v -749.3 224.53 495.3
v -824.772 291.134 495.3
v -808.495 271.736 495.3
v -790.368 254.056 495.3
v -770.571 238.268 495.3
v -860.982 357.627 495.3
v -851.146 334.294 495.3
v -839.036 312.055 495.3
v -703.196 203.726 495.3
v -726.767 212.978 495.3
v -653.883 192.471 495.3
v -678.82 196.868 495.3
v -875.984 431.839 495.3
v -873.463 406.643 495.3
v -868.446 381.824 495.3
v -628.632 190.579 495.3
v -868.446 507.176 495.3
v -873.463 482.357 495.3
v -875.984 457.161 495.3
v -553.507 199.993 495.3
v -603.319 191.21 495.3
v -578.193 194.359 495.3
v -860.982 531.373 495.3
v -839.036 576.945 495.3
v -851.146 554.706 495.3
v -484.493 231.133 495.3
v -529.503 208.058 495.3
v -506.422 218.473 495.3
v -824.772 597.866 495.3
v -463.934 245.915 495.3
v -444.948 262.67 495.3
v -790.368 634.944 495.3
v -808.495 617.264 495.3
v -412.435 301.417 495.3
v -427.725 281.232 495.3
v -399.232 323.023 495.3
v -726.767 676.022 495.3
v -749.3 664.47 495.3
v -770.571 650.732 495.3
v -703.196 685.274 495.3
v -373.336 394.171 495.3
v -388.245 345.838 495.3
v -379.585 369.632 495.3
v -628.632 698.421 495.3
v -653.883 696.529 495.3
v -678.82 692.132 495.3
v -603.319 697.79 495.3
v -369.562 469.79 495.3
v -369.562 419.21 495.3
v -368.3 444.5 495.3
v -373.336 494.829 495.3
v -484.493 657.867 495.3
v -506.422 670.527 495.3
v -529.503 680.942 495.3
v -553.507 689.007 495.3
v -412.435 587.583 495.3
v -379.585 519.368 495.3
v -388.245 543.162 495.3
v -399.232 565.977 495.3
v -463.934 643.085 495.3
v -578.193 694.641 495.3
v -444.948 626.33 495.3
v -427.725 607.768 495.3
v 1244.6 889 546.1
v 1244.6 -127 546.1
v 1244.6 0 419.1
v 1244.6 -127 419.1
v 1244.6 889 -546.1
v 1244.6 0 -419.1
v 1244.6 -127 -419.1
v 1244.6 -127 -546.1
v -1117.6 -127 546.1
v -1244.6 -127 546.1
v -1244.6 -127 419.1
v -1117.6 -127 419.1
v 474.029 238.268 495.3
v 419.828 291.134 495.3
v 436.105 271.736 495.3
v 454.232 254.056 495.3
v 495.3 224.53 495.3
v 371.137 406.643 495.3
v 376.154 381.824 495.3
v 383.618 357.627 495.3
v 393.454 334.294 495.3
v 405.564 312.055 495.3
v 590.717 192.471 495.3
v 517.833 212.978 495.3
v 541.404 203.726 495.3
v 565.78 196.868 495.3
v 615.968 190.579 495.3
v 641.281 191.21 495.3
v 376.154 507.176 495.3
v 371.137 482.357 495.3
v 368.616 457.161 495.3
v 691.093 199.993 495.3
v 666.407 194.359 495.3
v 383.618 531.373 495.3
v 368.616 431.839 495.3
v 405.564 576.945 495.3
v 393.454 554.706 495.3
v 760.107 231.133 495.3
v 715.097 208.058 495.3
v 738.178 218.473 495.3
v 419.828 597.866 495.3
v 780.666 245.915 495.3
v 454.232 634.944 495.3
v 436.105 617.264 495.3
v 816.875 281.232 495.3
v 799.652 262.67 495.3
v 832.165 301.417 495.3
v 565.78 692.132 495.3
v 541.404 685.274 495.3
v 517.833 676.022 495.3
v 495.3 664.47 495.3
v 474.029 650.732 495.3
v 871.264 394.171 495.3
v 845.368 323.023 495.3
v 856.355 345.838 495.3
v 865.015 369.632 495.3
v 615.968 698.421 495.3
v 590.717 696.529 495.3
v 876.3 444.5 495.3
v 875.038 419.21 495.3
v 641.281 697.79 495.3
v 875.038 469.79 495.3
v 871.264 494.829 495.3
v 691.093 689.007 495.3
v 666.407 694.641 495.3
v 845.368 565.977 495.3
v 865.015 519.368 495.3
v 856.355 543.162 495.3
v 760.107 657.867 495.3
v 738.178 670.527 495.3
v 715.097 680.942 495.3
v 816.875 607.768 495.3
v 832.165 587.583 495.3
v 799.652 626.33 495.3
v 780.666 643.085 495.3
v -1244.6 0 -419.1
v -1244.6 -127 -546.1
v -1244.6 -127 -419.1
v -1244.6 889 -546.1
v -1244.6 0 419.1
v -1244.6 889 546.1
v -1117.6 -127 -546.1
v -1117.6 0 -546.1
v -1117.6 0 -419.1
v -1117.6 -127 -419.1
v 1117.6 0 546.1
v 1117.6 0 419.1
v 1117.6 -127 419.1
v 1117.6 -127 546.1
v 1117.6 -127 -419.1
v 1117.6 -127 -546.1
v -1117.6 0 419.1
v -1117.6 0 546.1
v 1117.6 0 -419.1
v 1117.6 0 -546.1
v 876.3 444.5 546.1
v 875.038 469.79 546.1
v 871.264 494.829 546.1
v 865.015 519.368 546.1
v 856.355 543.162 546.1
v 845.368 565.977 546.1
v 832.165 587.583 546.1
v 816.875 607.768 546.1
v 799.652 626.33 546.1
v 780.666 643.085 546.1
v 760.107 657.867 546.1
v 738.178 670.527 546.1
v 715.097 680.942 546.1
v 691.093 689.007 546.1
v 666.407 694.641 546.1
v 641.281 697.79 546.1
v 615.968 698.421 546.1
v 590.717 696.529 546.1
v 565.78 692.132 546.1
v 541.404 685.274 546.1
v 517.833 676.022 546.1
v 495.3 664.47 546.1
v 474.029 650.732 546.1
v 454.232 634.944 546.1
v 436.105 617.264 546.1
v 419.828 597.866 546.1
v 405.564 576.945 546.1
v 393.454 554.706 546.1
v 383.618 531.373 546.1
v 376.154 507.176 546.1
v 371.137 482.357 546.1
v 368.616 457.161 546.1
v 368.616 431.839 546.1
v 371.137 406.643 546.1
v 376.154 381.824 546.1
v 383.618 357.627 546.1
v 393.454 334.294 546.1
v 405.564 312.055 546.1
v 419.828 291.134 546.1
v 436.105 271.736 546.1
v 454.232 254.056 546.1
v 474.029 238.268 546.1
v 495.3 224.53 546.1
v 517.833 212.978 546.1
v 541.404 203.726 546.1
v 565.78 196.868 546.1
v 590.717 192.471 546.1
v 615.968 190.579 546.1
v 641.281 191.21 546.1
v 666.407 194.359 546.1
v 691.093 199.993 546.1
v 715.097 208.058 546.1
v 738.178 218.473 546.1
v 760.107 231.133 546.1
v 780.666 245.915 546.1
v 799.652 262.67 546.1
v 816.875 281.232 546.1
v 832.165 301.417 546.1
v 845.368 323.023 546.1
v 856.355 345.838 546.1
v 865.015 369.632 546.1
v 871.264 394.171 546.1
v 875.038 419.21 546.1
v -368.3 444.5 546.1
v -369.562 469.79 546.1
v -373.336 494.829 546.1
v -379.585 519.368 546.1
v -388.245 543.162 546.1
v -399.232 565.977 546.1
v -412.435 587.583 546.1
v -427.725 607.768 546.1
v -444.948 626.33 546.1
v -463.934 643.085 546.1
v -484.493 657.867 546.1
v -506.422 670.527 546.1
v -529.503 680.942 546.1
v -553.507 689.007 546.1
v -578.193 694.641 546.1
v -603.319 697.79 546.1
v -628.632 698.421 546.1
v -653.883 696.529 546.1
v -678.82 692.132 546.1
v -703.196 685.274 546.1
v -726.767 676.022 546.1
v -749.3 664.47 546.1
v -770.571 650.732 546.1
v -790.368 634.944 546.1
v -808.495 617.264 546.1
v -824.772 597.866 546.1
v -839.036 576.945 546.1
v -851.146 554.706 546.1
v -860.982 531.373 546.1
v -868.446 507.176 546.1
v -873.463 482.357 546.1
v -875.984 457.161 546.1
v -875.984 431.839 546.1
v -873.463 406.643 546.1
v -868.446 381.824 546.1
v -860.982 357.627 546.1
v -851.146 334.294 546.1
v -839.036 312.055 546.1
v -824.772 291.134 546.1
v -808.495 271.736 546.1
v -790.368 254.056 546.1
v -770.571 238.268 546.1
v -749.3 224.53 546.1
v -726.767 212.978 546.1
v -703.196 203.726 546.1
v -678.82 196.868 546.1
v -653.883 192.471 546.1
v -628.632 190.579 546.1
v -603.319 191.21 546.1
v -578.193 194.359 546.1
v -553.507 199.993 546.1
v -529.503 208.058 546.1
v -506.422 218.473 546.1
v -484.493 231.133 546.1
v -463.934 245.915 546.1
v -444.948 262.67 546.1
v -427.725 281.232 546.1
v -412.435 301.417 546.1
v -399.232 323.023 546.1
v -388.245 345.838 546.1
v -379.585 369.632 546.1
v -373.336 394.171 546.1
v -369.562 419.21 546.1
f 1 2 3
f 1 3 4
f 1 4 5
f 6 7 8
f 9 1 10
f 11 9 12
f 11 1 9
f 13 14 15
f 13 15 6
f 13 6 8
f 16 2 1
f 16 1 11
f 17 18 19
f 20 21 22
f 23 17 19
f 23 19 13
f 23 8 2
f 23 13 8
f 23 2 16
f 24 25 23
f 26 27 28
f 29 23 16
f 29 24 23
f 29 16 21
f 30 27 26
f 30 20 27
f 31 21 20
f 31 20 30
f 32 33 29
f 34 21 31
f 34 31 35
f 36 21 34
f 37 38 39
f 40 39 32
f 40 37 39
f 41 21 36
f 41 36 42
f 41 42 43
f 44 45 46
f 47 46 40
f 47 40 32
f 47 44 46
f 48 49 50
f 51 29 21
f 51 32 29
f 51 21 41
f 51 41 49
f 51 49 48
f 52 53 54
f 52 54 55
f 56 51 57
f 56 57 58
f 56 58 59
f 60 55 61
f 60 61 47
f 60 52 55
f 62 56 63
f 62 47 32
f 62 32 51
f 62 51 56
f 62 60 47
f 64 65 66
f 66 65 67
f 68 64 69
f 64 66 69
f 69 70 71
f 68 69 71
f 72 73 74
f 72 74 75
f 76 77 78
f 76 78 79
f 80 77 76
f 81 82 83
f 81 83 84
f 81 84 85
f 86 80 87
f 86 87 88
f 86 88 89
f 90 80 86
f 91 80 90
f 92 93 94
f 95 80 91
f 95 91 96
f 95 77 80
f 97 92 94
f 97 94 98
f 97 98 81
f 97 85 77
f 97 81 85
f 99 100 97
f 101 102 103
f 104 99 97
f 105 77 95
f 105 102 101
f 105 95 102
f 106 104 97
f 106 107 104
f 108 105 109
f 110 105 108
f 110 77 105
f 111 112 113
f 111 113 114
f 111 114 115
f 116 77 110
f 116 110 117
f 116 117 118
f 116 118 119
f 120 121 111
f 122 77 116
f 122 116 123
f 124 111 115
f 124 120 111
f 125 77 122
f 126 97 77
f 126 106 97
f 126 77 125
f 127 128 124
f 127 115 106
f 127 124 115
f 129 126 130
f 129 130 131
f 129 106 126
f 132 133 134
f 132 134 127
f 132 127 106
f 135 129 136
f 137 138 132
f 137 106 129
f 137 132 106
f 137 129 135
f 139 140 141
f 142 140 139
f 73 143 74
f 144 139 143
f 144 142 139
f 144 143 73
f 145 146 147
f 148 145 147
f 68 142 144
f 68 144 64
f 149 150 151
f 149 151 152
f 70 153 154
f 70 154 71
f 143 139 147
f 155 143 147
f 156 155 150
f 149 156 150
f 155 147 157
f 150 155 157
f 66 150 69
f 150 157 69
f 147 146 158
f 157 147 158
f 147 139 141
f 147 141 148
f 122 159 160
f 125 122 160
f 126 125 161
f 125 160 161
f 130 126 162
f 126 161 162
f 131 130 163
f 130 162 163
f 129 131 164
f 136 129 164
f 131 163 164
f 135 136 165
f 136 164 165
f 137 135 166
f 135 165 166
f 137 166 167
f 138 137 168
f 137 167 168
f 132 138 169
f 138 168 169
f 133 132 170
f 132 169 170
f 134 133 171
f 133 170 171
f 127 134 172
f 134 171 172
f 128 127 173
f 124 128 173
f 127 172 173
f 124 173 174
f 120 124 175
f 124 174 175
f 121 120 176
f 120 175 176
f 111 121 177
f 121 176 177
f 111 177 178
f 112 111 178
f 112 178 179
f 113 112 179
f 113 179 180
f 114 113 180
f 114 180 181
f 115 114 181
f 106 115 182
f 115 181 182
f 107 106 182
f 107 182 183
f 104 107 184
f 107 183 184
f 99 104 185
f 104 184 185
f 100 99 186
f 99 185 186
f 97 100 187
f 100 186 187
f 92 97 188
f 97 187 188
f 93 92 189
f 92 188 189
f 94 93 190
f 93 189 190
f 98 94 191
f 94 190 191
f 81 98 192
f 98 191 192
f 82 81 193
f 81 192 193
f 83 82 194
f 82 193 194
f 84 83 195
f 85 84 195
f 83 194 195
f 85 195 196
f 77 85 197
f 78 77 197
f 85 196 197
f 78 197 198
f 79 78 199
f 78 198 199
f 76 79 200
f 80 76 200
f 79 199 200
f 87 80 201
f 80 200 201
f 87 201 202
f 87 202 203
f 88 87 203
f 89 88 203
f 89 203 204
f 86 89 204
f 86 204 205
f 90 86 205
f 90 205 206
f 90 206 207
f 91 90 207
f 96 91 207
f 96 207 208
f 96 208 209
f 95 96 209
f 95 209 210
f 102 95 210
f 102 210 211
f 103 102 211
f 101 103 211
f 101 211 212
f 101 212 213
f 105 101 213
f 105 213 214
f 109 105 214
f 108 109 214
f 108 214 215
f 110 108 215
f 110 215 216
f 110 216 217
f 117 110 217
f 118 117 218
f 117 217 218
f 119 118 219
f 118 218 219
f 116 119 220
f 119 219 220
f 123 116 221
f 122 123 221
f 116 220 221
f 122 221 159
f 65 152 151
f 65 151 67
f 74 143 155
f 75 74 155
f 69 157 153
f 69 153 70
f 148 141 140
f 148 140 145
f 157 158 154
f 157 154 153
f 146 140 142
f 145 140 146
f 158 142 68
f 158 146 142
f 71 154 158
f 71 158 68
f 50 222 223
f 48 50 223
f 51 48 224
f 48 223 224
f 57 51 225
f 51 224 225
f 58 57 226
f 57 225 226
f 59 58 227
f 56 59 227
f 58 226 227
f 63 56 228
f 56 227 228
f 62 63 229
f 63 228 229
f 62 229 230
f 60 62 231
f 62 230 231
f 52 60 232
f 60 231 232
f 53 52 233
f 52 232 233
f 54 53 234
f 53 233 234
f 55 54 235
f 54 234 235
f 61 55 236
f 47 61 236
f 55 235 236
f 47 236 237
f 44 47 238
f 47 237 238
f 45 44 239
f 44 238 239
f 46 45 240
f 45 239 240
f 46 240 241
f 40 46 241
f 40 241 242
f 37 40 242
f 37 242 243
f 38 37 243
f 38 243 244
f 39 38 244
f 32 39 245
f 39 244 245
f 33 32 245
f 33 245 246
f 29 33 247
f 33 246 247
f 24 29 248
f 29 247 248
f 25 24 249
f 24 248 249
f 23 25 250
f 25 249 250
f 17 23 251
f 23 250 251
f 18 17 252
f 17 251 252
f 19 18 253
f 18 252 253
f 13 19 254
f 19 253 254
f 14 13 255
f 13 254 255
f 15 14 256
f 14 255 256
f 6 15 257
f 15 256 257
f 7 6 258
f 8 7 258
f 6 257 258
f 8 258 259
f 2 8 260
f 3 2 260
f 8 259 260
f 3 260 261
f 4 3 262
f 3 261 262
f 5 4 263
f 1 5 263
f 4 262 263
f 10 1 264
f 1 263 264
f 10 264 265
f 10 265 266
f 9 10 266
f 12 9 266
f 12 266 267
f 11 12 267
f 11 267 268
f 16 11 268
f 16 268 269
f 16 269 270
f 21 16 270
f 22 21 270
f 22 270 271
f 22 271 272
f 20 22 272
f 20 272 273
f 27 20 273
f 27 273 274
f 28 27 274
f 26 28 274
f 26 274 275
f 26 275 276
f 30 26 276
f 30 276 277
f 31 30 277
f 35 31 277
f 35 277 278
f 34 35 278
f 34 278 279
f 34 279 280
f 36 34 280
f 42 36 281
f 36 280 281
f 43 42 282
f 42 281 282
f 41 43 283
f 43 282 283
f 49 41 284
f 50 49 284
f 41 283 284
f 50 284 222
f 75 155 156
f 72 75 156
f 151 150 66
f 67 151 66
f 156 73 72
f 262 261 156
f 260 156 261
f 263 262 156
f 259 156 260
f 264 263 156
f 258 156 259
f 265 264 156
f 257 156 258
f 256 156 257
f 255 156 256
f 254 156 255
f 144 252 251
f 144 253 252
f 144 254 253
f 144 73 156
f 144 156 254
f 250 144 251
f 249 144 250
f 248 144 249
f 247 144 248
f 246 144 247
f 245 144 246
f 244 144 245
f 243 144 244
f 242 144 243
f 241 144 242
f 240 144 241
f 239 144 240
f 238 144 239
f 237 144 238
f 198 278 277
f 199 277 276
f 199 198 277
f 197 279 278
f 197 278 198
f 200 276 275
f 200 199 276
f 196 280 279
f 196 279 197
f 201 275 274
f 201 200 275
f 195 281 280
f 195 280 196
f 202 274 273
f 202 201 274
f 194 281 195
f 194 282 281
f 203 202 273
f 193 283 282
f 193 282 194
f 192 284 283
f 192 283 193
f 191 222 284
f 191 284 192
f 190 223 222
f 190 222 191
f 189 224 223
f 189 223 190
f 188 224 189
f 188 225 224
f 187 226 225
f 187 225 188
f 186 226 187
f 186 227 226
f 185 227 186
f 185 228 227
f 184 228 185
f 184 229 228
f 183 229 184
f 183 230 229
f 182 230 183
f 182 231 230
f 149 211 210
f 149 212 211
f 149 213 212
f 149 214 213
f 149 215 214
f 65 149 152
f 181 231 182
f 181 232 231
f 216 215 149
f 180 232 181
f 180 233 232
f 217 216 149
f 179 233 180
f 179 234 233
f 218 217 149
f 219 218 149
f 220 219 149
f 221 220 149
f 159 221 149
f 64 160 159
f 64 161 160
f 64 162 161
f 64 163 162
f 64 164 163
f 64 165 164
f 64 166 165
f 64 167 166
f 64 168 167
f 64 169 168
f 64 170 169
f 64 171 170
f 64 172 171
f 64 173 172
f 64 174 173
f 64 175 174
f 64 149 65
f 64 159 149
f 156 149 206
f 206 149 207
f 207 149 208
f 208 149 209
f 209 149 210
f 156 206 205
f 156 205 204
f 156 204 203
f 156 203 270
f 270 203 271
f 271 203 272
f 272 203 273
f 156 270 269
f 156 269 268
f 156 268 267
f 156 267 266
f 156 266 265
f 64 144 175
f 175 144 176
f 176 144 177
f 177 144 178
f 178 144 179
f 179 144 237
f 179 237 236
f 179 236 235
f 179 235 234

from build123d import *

# Parameters (mm, degrees)
SKETCH1_W           = 2489.2
SKETCH1_H           = 1092.2
BOSS_EXTRUDE1_DEPTH = 889
SKETCH2_R           = 254
CUT_EXTRUDE1_DEPTH  = 50.8
SKETCH3_W           = 127
SKETCH3_H           = 127
BOSS_EXTRUDE2_DEPTH = 127


with BuildPart() as part:
    # Sketch1 → Boss-Extrude1 (new body)
    with BuildSketch(Plane(origin=(0, 0, 0), x_dir=(1, 0, 0), z_dir=(0, 1, 0))):
        Rectangle(SKETCH1_W, SKETCH1_H)
    extrude(amount=BOSS_EXTRUDE1_DEPTH)

    # Sketch2 → Cut-Extrude1 (cut)
    with BuildSketch(Plane.XY.offset(546.1)):
        with Locations((622.3, 444.5)):
            Circle(SKETCH2_R)
        with Locations((-622.3, 444.5)):
            Circle(SKETCH2_R)
    extrude(amount=-CUT_EXTRUDE1_DEPTH, mode=Mode.SUBTRACT)

    # Sketch3 → Boss-Extrude2 (add)
    with BuildSketch(Plane.XZ):
        with Locations((-1181.1, 482.6)):
            Rectangle(SKETCH3_W, SKETCH3_H)
        with Locations((-1181.1, -482.6)):
            Rectangle(SKETCH3_W, SKETCH3_H)
        with Locations((1181.1, 482.6)):
            Rectangle(SKETCH3_W, SKETCH3_H)
        with Locations((1181.1, -482.6)):
            Rectangle(SKETCH3_W, SKETCH3_H)
    extrude(amount=BOSS_EXTRUDE2_DEPTH)


solid = part.part
